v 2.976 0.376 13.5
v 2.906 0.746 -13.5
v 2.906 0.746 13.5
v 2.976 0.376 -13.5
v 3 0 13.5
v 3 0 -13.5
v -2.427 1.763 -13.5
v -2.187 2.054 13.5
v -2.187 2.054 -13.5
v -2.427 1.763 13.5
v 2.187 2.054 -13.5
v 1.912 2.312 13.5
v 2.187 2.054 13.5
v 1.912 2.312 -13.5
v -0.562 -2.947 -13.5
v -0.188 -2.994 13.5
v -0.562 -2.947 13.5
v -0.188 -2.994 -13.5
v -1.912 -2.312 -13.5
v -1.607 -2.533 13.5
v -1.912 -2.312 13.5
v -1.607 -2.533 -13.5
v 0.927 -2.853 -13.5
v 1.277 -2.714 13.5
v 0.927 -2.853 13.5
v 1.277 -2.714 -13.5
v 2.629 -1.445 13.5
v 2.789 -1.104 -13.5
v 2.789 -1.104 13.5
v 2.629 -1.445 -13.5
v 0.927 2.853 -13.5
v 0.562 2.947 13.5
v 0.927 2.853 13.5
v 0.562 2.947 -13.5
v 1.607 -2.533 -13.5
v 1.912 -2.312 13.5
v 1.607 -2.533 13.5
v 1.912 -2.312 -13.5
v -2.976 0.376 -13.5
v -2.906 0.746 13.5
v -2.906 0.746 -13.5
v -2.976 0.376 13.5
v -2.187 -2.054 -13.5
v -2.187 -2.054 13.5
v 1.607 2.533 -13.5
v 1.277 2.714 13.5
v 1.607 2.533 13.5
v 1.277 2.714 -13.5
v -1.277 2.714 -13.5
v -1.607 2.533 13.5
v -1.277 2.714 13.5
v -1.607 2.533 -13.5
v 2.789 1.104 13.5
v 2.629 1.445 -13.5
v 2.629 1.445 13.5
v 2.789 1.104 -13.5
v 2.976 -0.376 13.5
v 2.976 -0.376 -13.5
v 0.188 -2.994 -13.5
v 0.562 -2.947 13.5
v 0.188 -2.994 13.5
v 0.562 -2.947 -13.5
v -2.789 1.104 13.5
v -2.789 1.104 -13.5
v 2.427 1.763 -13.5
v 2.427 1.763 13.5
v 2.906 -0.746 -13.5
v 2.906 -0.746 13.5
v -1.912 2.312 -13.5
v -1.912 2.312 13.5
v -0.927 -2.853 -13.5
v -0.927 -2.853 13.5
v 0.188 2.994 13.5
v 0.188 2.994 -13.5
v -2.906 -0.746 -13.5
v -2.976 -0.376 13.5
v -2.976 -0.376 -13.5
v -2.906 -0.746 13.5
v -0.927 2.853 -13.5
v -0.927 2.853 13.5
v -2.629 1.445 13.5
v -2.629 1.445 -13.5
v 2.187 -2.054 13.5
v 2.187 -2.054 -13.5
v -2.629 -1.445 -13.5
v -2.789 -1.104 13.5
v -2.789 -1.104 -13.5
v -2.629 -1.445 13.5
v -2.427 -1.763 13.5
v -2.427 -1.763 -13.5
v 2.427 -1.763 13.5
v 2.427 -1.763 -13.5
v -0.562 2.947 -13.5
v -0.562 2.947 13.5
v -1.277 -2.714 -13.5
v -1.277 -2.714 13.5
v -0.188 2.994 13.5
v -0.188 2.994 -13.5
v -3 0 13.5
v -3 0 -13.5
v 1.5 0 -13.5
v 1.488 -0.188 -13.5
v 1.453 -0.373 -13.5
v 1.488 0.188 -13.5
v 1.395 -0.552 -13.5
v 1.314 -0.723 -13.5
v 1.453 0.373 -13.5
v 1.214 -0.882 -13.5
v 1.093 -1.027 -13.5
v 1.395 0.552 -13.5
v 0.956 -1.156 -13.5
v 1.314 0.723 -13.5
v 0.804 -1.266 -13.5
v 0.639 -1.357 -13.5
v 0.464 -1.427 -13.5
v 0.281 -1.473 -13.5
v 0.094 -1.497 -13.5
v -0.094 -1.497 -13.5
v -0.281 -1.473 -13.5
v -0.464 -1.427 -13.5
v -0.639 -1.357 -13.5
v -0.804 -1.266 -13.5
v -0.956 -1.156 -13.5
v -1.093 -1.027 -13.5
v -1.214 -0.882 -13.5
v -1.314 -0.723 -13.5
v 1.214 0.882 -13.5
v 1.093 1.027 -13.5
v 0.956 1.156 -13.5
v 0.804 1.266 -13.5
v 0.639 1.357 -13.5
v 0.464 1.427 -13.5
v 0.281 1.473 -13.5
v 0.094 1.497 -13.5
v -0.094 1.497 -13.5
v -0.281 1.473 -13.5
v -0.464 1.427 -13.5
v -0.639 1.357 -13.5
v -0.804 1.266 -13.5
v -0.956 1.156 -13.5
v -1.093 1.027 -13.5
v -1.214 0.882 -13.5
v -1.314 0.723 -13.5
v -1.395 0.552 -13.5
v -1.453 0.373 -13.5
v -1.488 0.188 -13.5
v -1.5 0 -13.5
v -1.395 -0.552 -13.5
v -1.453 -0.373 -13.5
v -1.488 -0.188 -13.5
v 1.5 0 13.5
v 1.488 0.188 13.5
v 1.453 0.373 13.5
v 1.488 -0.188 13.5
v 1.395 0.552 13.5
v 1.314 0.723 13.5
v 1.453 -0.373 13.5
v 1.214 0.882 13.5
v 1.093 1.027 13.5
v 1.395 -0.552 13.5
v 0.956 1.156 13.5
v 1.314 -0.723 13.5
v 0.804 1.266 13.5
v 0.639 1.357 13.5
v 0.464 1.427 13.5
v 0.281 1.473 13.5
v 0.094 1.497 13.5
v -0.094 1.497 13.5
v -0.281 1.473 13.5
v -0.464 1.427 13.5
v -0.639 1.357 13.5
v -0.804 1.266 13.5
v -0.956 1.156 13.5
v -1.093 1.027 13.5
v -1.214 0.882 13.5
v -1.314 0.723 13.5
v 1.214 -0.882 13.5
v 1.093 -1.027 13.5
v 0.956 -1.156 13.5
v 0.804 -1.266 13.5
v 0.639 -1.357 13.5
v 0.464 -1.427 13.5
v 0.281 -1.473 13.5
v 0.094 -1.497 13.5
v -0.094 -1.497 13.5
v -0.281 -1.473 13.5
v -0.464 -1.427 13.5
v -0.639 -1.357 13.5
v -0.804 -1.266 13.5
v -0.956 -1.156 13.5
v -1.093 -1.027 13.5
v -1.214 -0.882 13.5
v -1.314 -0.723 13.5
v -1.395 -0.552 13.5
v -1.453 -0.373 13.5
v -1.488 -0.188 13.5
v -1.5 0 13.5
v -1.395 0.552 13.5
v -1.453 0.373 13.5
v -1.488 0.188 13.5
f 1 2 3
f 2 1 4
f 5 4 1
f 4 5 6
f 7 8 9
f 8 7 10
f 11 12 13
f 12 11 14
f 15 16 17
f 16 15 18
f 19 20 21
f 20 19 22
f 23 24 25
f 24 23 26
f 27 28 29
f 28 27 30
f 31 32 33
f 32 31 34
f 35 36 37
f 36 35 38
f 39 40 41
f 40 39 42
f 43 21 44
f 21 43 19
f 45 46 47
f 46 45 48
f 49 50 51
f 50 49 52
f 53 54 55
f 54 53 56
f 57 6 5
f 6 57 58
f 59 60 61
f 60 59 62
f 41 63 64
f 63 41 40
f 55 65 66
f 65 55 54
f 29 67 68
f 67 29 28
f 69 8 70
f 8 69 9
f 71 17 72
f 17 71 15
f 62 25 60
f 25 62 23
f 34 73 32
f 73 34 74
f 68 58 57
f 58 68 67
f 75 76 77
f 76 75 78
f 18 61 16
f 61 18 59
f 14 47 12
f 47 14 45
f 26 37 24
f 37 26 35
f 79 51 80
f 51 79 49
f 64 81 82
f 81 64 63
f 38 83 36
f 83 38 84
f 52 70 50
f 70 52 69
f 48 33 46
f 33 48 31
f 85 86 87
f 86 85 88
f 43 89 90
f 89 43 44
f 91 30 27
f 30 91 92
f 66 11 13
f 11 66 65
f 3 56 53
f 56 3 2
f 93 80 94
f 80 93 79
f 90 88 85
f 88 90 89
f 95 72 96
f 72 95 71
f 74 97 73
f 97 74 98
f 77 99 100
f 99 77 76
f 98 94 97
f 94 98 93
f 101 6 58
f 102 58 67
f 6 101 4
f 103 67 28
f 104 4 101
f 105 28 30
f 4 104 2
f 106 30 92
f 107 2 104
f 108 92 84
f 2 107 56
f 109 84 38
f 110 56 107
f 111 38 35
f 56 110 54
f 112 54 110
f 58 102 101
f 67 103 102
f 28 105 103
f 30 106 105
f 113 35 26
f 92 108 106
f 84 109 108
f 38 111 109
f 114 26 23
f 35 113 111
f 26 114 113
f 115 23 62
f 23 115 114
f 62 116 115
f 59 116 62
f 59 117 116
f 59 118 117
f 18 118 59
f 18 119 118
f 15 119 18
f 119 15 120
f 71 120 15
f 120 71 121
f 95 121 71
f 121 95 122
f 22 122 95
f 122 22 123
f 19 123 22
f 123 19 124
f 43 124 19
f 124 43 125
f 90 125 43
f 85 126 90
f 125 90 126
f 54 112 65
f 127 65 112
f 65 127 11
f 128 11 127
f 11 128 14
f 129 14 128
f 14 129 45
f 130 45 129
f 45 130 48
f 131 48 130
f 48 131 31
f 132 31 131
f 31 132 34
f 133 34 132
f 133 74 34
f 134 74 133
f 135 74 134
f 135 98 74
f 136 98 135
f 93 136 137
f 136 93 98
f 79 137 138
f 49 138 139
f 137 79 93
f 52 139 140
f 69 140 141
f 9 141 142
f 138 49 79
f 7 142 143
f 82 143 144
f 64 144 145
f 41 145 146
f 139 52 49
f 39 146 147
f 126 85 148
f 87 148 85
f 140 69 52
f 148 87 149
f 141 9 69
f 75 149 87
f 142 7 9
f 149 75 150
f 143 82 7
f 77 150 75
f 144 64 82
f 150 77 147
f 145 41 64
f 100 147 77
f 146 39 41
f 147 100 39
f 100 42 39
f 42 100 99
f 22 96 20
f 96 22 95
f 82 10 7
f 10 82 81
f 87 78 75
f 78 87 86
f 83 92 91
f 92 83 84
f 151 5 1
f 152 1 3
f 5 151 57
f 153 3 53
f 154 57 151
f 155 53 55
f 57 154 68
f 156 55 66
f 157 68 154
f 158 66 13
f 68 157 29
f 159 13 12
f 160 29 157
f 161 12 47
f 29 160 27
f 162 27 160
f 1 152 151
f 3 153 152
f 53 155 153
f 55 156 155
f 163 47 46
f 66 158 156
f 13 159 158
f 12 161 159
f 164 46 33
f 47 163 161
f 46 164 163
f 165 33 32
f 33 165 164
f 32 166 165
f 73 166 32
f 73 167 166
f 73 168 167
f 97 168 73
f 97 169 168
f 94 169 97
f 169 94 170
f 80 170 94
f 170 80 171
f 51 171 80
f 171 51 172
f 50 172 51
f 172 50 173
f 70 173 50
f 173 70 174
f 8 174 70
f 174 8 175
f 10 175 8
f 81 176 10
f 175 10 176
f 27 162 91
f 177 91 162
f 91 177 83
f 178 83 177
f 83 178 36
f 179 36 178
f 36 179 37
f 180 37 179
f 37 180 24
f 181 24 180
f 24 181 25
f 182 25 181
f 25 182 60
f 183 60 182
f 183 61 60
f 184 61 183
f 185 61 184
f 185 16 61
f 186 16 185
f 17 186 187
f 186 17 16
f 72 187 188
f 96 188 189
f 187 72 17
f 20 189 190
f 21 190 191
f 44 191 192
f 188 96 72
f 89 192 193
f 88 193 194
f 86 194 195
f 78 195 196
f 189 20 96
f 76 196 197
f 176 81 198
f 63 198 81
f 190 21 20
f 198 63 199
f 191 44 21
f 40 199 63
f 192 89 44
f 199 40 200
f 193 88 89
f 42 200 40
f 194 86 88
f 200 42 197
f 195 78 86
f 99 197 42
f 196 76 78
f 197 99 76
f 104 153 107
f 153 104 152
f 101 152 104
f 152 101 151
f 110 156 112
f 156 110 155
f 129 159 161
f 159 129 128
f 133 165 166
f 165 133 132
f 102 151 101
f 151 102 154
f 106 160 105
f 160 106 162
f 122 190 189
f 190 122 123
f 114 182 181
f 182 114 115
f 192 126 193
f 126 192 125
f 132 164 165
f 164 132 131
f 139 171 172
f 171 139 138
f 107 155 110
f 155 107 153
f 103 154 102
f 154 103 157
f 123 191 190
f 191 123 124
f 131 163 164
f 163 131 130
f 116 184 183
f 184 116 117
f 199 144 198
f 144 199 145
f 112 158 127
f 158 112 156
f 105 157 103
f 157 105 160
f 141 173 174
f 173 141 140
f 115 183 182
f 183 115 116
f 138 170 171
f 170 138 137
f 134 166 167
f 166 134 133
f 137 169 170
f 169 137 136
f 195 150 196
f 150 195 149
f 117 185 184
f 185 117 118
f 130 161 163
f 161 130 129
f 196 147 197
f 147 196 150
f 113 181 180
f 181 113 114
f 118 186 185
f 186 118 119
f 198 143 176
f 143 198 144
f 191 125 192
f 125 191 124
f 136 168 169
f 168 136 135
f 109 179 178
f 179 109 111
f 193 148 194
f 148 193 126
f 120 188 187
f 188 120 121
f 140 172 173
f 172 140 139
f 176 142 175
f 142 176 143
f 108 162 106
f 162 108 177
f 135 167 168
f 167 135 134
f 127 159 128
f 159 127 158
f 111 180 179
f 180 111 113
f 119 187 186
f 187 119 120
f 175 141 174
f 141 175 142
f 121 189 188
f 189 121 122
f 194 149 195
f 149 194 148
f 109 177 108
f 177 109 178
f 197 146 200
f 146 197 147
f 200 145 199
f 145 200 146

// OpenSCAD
$fn = 50;


difference() {
	union() {
		translate(v = [0, 0, -13.5000000000]) {
			cylinder(h = 27, r = 3.0000000000);
		}
	}
	union() {
		translate(v = [0, 0, -100.0000000000]) {
			cylinder(h = 200, r = 1.5000000000);
		}
	}
}
